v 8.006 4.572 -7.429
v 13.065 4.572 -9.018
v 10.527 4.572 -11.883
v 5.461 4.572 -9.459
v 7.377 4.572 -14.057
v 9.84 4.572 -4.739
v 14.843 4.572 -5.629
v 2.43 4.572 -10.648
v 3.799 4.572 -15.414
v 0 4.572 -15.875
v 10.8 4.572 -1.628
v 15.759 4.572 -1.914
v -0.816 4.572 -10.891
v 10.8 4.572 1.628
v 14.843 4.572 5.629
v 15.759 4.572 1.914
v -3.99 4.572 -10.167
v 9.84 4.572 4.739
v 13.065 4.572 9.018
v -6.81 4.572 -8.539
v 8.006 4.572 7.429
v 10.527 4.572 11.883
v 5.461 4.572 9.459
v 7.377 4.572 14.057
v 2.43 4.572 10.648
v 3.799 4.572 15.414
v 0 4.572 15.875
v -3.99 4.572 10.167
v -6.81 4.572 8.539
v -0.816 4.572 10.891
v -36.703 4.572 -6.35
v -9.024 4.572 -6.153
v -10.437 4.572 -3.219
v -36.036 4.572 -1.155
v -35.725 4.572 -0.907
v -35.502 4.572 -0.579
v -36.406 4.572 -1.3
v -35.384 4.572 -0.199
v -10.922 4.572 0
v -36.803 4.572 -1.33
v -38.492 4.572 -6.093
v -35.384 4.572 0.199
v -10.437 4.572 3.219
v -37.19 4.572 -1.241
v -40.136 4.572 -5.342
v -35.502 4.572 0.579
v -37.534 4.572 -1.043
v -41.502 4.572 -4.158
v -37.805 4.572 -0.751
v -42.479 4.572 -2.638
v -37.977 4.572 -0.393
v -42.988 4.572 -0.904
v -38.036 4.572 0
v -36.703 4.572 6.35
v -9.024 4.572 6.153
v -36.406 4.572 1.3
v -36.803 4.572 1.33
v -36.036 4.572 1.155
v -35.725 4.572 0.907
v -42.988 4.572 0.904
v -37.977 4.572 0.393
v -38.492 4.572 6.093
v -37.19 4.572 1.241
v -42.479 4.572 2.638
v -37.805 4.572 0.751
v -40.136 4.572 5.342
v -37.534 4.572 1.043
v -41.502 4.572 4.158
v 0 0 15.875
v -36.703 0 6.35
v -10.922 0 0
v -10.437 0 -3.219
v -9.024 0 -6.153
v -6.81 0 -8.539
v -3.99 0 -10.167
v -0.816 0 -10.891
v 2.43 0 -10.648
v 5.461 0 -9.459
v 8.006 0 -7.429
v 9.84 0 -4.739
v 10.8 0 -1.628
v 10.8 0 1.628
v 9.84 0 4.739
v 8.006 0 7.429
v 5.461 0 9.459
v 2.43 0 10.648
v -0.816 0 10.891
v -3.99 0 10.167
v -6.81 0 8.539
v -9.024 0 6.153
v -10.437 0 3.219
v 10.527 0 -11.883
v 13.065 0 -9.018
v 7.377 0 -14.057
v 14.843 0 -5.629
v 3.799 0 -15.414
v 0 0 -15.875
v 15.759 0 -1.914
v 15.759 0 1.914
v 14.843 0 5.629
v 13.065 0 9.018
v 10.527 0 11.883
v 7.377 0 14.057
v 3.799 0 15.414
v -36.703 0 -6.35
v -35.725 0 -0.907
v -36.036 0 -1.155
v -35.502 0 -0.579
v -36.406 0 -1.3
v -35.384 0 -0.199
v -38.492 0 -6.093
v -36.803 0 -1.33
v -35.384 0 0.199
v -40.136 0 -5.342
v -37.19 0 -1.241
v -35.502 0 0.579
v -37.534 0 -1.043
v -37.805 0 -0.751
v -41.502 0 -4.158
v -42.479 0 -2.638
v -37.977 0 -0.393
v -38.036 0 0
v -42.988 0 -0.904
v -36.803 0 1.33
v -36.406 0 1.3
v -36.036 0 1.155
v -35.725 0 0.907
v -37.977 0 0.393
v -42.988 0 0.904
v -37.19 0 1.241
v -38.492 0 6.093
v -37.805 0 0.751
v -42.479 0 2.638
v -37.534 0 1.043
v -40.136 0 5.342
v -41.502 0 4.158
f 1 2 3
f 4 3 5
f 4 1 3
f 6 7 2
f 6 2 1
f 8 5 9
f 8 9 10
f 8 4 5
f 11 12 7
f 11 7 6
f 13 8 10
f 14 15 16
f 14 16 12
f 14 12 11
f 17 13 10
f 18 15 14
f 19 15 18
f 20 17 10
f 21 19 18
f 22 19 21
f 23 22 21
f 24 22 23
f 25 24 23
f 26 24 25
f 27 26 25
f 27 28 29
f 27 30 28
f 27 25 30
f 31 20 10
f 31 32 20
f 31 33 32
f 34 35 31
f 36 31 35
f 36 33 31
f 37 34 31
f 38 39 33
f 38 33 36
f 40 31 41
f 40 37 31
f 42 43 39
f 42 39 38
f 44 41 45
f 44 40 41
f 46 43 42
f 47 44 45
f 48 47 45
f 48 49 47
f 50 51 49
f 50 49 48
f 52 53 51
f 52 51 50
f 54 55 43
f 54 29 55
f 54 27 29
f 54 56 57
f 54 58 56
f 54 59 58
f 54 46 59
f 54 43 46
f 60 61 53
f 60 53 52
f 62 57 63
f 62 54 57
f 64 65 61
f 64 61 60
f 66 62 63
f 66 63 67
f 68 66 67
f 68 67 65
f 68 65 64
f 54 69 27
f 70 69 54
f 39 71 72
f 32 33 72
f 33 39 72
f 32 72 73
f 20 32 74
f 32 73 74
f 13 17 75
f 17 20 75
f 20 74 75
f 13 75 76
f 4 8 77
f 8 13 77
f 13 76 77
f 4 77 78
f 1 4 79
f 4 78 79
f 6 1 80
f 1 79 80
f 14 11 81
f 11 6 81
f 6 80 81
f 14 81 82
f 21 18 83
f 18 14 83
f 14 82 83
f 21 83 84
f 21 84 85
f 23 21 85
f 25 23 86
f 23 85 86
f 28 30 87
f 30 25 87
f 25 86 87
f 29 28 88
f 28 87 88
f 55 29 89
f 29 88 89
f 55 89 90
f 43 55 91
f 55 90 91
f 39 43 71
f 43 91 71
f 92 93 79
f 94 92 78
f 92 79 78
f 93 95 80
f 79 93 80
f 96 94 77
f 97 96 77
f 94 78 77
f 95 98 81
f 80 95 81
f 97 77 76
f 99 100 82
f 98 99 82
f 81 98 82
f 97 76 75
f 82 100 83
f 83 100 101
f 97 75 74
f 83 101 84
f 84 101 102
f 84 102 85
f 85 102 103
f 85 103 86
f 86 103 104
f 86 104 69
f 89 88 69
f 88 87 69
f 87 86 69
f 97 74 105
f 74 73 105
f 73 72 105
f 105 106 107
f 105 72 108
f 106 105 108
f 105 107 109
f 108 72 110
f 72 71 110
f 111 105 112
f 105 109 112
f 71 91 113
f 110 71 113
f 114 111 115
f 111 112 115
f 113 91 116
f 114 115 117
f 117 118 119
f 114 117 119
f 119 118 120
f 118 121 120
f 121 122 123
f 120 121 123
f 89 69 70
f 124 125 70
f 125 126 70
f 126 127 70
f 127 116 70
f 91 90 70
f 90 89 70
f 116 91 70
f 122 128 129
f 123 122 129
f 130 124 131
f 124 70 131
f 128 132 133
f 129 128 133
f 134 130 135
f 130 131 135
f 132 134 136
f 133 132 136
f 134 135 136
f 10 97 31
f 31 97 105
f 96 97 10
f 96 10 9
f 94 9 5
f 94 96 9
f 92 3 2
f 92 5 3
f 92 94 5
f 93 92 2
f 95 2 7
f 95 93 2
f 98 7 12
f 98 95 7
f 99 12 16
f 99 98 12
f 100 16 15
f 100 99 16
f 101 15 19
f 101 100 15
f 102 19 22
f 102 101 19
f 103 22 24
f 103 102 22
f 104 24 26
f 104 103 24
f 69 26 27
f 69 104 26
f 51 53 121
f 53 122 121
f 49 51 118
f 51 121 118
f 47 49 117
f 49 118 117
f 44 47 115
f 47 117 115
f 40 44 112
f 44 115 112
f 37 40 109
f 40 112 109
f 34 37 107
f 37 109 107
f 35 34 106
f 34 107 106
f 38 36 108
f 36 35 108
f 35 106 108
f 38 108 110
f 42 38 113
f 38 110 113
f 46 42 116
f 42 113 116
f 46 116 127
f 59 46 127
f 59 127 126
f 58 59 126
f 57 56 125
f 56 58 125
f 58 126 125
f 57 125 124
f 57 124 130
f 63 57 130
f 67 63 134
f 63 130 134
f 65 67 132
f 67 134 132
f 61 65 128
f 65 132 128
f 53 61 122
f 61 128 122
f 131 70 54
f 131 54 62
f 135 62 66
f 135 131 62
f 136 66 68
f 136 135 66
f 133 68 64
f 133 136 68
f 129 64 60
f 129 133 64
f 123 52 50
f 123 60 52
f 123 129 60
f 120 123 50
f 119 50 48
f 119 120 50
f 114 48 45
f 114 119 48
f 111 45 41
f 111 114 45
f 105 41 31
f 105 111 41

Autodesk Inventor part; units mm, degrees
ref_plane "YZ Plane" through (0, 0, 0) normal (1, 0, 0) x (0, 1, 0)
ref_plane "XZ Plane" through (0, 0, 0) normal (0, 1, 0) x (-1, 0, 0)
ref_plane "XY Plane" through (0, 0, 0) normal (0, 0, 1) x (1, 0, 0)
sketch "Sketch1" plane through (0, 0, 0) normal (0, 1, 0) x (-1, 0, 0)
  circle A0 centre (0, 0) radius 10.922
  arc A1 (0, 15.875) -> (0, -15.875) centre (0, 0) ccw
  line L0 (0, 0) -> (36.703, 0) construction
  arc A2 (36.703, -6.35) -> (36.703, 6.35) centre (36.703, 0) ccw
  line L1 (0, 15.875) -> (36.703, 6.35)
  line L2 (0, -15.875) -> (36.703, -6.35)
  circle A3 centre (36.703, 0) radius 1.3335
  dimension "d0" = 21.844
  dimension "d1" = 31.75
  dimension "d2" = 36.703
  dimension "d3" = 12.7
  dimension "d4" = 2.667
extrude "Extrusion1" add sketch "Sketch1" along normal blind 4.572
properties part number "Light_Hooker"
